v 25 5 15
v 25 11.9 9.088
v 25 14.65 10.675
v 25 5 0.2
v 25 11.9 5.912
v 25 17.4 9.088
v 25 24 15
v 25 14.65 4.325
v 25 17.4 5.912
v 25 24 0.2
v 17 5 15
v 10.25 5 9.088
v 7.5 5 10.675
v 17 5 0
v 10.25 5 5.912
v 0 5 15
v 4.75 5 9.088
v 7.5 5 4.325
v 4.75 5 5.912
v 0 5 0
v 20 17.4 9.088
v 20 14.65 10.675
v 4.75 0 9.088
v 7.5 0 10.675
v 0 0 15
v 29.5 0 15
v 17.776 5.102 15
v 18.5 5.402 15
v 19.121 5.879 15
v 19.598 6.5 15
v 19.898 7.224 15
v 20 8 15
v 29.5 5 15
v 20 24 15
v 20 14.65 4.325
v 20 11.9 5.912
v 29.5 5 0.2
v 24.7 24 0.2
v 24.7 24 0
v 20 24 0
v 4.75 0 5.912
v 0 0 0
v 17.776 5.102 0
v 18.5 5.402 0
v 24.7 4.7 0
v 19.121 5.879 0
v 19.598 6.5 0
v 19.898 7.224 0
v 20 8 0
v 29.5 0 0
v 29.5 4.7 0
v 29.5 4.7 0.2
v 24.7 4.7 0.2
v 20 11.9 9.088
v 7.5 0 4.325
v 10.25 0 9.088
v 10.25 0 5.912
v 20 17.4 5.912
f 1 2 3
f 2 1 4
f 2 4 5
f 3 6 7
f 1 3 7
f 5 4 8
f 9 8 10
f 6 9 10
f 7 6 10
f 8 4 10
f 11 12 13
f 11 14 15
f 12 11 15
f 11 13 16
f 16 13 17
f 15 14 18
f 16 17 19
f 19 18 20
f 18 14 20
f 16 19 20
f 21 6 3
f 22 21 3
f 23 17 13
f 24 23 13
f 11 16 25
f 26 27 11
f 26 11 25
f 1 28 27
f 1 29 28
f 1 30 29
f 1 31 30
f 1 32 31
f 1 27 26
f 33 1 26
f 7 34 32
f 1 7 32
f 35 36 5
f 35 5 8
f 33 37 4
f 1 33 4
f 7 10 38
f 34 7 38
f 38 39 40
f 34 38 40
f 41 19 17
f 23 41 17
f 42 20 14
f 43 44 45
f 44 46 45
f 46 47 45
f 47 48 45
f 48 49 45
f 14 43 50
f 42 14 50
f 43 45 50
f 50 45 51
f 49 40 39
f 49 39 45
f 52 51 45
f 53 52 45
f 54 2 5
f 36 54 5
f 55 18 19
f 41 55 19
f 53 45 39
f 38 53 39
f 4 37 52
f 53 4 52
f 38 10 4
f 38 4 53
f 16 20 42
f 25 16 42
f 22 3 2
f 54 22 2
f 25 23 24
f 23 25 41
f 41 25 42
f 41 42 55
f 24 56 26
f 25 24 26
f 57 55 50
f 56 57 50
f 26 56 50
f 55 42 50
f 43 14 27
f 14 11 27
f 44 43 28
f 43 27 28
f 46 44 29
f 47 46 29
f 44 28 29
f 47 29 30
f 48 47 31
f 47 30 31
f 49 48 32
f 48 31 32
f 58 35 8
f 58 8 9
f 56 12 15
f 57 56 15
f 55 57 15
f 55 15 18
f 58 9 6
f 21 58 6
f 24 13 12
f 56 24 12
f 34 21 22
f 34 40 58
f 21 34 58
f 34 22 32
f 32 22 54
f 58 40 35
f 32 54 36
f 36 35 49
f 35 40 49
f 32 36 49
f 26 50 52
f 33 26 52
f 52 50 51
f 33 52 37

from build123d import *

# Parameters (mm, degrees)
BOSS_EXTRUDE1_DEPTH = 15
CUT_EXTRUDE1_DEPTH  = 39.160843806
CUT_EXTRUDE2_DEPTH  = 38.762415177
CUT_EXTRUDE4_DEPTH  = 0.2
FILLET1_R           = 3


with BuildPart() as part:
    # Sketch2 → Boss-Extrude1 (new body)
    with BuildSketch(Plane.XY):
        Polygon((0, 0), (29.5, 0), (29.5, 5), (25, 5), (25, 24), (20, 24), (20, 5), (0, 5), align=None)
    extrude(amount=BOSS_EXTRUDE1_DEPTH)

    # Sketch3 → Cut-Extrude1 (cut, through all)
    with BuildSketch(Plane(origin=(0, 5, 0), x_dir=(1, 0, 0), z_dir=(0, 1, 0))):
        Polygon((10.25, -5.91228676), (7.5, -4.324573519), (4.75, -5.91228676), (4.75, -9.08771324), (7.5, -10.675426481), (10.25, -9.08771324), align=None)
        Polygon((44.25, -9.08771324), (44.25, -5.91228676), (47, -4.324573519), (49.75, -5.91228676), (49.75, -9.08771324), (47, -10.675426481), align=None)
    extrude(amount=-CUT_EXTRUDE1_DEPTH, mode=Mode.SUBTRACT)

    # Sketch4 → Cut-Extrude2 (cut, through all)
    with BuildSketch(Plane(origin=(25, 0, 0), x_dir=(0, 0, -1), z_dir=(1, 0, 0))):
        Polygon((-5.91228676, 11.9), (-4.324573519, 14.65), (-5.91228676, 17.4), (-9.08771324, 17.4), (-10.675426481, 14.65), (-9.08771324, 11.9), align=None)
    extrude(amount=-CUT_EXTRUDE2_DEPTH, mode=Mode.SUBTRACT)

    # Sketch5 → Cut-Extrude4 (cut)
    with BuildSketch(Plane(origin=(0, 0, 0), x_dir=(-1, 0, 0), z_dir=(0, 0, -1))):
        Polygon((-24.7, 4.7), (-24.7, 23.7), (-24.7, 24), (-25, 24), (-25, 5), (-29.5, 5), (-29.5, 4.7), align=None)
    extrude(amount=-CUT_EXTRUDE4_DEPTH, mode=Mode.SUBTRACT)

    # Fillet1
    fillet1_edges = [part.edges().sort_by_distance(p)[0] for p in [
        (20, 5, 7.5),
    ]]
    fillet(fillet1_edges, radius=FILLET1_R)


solid = part.part
